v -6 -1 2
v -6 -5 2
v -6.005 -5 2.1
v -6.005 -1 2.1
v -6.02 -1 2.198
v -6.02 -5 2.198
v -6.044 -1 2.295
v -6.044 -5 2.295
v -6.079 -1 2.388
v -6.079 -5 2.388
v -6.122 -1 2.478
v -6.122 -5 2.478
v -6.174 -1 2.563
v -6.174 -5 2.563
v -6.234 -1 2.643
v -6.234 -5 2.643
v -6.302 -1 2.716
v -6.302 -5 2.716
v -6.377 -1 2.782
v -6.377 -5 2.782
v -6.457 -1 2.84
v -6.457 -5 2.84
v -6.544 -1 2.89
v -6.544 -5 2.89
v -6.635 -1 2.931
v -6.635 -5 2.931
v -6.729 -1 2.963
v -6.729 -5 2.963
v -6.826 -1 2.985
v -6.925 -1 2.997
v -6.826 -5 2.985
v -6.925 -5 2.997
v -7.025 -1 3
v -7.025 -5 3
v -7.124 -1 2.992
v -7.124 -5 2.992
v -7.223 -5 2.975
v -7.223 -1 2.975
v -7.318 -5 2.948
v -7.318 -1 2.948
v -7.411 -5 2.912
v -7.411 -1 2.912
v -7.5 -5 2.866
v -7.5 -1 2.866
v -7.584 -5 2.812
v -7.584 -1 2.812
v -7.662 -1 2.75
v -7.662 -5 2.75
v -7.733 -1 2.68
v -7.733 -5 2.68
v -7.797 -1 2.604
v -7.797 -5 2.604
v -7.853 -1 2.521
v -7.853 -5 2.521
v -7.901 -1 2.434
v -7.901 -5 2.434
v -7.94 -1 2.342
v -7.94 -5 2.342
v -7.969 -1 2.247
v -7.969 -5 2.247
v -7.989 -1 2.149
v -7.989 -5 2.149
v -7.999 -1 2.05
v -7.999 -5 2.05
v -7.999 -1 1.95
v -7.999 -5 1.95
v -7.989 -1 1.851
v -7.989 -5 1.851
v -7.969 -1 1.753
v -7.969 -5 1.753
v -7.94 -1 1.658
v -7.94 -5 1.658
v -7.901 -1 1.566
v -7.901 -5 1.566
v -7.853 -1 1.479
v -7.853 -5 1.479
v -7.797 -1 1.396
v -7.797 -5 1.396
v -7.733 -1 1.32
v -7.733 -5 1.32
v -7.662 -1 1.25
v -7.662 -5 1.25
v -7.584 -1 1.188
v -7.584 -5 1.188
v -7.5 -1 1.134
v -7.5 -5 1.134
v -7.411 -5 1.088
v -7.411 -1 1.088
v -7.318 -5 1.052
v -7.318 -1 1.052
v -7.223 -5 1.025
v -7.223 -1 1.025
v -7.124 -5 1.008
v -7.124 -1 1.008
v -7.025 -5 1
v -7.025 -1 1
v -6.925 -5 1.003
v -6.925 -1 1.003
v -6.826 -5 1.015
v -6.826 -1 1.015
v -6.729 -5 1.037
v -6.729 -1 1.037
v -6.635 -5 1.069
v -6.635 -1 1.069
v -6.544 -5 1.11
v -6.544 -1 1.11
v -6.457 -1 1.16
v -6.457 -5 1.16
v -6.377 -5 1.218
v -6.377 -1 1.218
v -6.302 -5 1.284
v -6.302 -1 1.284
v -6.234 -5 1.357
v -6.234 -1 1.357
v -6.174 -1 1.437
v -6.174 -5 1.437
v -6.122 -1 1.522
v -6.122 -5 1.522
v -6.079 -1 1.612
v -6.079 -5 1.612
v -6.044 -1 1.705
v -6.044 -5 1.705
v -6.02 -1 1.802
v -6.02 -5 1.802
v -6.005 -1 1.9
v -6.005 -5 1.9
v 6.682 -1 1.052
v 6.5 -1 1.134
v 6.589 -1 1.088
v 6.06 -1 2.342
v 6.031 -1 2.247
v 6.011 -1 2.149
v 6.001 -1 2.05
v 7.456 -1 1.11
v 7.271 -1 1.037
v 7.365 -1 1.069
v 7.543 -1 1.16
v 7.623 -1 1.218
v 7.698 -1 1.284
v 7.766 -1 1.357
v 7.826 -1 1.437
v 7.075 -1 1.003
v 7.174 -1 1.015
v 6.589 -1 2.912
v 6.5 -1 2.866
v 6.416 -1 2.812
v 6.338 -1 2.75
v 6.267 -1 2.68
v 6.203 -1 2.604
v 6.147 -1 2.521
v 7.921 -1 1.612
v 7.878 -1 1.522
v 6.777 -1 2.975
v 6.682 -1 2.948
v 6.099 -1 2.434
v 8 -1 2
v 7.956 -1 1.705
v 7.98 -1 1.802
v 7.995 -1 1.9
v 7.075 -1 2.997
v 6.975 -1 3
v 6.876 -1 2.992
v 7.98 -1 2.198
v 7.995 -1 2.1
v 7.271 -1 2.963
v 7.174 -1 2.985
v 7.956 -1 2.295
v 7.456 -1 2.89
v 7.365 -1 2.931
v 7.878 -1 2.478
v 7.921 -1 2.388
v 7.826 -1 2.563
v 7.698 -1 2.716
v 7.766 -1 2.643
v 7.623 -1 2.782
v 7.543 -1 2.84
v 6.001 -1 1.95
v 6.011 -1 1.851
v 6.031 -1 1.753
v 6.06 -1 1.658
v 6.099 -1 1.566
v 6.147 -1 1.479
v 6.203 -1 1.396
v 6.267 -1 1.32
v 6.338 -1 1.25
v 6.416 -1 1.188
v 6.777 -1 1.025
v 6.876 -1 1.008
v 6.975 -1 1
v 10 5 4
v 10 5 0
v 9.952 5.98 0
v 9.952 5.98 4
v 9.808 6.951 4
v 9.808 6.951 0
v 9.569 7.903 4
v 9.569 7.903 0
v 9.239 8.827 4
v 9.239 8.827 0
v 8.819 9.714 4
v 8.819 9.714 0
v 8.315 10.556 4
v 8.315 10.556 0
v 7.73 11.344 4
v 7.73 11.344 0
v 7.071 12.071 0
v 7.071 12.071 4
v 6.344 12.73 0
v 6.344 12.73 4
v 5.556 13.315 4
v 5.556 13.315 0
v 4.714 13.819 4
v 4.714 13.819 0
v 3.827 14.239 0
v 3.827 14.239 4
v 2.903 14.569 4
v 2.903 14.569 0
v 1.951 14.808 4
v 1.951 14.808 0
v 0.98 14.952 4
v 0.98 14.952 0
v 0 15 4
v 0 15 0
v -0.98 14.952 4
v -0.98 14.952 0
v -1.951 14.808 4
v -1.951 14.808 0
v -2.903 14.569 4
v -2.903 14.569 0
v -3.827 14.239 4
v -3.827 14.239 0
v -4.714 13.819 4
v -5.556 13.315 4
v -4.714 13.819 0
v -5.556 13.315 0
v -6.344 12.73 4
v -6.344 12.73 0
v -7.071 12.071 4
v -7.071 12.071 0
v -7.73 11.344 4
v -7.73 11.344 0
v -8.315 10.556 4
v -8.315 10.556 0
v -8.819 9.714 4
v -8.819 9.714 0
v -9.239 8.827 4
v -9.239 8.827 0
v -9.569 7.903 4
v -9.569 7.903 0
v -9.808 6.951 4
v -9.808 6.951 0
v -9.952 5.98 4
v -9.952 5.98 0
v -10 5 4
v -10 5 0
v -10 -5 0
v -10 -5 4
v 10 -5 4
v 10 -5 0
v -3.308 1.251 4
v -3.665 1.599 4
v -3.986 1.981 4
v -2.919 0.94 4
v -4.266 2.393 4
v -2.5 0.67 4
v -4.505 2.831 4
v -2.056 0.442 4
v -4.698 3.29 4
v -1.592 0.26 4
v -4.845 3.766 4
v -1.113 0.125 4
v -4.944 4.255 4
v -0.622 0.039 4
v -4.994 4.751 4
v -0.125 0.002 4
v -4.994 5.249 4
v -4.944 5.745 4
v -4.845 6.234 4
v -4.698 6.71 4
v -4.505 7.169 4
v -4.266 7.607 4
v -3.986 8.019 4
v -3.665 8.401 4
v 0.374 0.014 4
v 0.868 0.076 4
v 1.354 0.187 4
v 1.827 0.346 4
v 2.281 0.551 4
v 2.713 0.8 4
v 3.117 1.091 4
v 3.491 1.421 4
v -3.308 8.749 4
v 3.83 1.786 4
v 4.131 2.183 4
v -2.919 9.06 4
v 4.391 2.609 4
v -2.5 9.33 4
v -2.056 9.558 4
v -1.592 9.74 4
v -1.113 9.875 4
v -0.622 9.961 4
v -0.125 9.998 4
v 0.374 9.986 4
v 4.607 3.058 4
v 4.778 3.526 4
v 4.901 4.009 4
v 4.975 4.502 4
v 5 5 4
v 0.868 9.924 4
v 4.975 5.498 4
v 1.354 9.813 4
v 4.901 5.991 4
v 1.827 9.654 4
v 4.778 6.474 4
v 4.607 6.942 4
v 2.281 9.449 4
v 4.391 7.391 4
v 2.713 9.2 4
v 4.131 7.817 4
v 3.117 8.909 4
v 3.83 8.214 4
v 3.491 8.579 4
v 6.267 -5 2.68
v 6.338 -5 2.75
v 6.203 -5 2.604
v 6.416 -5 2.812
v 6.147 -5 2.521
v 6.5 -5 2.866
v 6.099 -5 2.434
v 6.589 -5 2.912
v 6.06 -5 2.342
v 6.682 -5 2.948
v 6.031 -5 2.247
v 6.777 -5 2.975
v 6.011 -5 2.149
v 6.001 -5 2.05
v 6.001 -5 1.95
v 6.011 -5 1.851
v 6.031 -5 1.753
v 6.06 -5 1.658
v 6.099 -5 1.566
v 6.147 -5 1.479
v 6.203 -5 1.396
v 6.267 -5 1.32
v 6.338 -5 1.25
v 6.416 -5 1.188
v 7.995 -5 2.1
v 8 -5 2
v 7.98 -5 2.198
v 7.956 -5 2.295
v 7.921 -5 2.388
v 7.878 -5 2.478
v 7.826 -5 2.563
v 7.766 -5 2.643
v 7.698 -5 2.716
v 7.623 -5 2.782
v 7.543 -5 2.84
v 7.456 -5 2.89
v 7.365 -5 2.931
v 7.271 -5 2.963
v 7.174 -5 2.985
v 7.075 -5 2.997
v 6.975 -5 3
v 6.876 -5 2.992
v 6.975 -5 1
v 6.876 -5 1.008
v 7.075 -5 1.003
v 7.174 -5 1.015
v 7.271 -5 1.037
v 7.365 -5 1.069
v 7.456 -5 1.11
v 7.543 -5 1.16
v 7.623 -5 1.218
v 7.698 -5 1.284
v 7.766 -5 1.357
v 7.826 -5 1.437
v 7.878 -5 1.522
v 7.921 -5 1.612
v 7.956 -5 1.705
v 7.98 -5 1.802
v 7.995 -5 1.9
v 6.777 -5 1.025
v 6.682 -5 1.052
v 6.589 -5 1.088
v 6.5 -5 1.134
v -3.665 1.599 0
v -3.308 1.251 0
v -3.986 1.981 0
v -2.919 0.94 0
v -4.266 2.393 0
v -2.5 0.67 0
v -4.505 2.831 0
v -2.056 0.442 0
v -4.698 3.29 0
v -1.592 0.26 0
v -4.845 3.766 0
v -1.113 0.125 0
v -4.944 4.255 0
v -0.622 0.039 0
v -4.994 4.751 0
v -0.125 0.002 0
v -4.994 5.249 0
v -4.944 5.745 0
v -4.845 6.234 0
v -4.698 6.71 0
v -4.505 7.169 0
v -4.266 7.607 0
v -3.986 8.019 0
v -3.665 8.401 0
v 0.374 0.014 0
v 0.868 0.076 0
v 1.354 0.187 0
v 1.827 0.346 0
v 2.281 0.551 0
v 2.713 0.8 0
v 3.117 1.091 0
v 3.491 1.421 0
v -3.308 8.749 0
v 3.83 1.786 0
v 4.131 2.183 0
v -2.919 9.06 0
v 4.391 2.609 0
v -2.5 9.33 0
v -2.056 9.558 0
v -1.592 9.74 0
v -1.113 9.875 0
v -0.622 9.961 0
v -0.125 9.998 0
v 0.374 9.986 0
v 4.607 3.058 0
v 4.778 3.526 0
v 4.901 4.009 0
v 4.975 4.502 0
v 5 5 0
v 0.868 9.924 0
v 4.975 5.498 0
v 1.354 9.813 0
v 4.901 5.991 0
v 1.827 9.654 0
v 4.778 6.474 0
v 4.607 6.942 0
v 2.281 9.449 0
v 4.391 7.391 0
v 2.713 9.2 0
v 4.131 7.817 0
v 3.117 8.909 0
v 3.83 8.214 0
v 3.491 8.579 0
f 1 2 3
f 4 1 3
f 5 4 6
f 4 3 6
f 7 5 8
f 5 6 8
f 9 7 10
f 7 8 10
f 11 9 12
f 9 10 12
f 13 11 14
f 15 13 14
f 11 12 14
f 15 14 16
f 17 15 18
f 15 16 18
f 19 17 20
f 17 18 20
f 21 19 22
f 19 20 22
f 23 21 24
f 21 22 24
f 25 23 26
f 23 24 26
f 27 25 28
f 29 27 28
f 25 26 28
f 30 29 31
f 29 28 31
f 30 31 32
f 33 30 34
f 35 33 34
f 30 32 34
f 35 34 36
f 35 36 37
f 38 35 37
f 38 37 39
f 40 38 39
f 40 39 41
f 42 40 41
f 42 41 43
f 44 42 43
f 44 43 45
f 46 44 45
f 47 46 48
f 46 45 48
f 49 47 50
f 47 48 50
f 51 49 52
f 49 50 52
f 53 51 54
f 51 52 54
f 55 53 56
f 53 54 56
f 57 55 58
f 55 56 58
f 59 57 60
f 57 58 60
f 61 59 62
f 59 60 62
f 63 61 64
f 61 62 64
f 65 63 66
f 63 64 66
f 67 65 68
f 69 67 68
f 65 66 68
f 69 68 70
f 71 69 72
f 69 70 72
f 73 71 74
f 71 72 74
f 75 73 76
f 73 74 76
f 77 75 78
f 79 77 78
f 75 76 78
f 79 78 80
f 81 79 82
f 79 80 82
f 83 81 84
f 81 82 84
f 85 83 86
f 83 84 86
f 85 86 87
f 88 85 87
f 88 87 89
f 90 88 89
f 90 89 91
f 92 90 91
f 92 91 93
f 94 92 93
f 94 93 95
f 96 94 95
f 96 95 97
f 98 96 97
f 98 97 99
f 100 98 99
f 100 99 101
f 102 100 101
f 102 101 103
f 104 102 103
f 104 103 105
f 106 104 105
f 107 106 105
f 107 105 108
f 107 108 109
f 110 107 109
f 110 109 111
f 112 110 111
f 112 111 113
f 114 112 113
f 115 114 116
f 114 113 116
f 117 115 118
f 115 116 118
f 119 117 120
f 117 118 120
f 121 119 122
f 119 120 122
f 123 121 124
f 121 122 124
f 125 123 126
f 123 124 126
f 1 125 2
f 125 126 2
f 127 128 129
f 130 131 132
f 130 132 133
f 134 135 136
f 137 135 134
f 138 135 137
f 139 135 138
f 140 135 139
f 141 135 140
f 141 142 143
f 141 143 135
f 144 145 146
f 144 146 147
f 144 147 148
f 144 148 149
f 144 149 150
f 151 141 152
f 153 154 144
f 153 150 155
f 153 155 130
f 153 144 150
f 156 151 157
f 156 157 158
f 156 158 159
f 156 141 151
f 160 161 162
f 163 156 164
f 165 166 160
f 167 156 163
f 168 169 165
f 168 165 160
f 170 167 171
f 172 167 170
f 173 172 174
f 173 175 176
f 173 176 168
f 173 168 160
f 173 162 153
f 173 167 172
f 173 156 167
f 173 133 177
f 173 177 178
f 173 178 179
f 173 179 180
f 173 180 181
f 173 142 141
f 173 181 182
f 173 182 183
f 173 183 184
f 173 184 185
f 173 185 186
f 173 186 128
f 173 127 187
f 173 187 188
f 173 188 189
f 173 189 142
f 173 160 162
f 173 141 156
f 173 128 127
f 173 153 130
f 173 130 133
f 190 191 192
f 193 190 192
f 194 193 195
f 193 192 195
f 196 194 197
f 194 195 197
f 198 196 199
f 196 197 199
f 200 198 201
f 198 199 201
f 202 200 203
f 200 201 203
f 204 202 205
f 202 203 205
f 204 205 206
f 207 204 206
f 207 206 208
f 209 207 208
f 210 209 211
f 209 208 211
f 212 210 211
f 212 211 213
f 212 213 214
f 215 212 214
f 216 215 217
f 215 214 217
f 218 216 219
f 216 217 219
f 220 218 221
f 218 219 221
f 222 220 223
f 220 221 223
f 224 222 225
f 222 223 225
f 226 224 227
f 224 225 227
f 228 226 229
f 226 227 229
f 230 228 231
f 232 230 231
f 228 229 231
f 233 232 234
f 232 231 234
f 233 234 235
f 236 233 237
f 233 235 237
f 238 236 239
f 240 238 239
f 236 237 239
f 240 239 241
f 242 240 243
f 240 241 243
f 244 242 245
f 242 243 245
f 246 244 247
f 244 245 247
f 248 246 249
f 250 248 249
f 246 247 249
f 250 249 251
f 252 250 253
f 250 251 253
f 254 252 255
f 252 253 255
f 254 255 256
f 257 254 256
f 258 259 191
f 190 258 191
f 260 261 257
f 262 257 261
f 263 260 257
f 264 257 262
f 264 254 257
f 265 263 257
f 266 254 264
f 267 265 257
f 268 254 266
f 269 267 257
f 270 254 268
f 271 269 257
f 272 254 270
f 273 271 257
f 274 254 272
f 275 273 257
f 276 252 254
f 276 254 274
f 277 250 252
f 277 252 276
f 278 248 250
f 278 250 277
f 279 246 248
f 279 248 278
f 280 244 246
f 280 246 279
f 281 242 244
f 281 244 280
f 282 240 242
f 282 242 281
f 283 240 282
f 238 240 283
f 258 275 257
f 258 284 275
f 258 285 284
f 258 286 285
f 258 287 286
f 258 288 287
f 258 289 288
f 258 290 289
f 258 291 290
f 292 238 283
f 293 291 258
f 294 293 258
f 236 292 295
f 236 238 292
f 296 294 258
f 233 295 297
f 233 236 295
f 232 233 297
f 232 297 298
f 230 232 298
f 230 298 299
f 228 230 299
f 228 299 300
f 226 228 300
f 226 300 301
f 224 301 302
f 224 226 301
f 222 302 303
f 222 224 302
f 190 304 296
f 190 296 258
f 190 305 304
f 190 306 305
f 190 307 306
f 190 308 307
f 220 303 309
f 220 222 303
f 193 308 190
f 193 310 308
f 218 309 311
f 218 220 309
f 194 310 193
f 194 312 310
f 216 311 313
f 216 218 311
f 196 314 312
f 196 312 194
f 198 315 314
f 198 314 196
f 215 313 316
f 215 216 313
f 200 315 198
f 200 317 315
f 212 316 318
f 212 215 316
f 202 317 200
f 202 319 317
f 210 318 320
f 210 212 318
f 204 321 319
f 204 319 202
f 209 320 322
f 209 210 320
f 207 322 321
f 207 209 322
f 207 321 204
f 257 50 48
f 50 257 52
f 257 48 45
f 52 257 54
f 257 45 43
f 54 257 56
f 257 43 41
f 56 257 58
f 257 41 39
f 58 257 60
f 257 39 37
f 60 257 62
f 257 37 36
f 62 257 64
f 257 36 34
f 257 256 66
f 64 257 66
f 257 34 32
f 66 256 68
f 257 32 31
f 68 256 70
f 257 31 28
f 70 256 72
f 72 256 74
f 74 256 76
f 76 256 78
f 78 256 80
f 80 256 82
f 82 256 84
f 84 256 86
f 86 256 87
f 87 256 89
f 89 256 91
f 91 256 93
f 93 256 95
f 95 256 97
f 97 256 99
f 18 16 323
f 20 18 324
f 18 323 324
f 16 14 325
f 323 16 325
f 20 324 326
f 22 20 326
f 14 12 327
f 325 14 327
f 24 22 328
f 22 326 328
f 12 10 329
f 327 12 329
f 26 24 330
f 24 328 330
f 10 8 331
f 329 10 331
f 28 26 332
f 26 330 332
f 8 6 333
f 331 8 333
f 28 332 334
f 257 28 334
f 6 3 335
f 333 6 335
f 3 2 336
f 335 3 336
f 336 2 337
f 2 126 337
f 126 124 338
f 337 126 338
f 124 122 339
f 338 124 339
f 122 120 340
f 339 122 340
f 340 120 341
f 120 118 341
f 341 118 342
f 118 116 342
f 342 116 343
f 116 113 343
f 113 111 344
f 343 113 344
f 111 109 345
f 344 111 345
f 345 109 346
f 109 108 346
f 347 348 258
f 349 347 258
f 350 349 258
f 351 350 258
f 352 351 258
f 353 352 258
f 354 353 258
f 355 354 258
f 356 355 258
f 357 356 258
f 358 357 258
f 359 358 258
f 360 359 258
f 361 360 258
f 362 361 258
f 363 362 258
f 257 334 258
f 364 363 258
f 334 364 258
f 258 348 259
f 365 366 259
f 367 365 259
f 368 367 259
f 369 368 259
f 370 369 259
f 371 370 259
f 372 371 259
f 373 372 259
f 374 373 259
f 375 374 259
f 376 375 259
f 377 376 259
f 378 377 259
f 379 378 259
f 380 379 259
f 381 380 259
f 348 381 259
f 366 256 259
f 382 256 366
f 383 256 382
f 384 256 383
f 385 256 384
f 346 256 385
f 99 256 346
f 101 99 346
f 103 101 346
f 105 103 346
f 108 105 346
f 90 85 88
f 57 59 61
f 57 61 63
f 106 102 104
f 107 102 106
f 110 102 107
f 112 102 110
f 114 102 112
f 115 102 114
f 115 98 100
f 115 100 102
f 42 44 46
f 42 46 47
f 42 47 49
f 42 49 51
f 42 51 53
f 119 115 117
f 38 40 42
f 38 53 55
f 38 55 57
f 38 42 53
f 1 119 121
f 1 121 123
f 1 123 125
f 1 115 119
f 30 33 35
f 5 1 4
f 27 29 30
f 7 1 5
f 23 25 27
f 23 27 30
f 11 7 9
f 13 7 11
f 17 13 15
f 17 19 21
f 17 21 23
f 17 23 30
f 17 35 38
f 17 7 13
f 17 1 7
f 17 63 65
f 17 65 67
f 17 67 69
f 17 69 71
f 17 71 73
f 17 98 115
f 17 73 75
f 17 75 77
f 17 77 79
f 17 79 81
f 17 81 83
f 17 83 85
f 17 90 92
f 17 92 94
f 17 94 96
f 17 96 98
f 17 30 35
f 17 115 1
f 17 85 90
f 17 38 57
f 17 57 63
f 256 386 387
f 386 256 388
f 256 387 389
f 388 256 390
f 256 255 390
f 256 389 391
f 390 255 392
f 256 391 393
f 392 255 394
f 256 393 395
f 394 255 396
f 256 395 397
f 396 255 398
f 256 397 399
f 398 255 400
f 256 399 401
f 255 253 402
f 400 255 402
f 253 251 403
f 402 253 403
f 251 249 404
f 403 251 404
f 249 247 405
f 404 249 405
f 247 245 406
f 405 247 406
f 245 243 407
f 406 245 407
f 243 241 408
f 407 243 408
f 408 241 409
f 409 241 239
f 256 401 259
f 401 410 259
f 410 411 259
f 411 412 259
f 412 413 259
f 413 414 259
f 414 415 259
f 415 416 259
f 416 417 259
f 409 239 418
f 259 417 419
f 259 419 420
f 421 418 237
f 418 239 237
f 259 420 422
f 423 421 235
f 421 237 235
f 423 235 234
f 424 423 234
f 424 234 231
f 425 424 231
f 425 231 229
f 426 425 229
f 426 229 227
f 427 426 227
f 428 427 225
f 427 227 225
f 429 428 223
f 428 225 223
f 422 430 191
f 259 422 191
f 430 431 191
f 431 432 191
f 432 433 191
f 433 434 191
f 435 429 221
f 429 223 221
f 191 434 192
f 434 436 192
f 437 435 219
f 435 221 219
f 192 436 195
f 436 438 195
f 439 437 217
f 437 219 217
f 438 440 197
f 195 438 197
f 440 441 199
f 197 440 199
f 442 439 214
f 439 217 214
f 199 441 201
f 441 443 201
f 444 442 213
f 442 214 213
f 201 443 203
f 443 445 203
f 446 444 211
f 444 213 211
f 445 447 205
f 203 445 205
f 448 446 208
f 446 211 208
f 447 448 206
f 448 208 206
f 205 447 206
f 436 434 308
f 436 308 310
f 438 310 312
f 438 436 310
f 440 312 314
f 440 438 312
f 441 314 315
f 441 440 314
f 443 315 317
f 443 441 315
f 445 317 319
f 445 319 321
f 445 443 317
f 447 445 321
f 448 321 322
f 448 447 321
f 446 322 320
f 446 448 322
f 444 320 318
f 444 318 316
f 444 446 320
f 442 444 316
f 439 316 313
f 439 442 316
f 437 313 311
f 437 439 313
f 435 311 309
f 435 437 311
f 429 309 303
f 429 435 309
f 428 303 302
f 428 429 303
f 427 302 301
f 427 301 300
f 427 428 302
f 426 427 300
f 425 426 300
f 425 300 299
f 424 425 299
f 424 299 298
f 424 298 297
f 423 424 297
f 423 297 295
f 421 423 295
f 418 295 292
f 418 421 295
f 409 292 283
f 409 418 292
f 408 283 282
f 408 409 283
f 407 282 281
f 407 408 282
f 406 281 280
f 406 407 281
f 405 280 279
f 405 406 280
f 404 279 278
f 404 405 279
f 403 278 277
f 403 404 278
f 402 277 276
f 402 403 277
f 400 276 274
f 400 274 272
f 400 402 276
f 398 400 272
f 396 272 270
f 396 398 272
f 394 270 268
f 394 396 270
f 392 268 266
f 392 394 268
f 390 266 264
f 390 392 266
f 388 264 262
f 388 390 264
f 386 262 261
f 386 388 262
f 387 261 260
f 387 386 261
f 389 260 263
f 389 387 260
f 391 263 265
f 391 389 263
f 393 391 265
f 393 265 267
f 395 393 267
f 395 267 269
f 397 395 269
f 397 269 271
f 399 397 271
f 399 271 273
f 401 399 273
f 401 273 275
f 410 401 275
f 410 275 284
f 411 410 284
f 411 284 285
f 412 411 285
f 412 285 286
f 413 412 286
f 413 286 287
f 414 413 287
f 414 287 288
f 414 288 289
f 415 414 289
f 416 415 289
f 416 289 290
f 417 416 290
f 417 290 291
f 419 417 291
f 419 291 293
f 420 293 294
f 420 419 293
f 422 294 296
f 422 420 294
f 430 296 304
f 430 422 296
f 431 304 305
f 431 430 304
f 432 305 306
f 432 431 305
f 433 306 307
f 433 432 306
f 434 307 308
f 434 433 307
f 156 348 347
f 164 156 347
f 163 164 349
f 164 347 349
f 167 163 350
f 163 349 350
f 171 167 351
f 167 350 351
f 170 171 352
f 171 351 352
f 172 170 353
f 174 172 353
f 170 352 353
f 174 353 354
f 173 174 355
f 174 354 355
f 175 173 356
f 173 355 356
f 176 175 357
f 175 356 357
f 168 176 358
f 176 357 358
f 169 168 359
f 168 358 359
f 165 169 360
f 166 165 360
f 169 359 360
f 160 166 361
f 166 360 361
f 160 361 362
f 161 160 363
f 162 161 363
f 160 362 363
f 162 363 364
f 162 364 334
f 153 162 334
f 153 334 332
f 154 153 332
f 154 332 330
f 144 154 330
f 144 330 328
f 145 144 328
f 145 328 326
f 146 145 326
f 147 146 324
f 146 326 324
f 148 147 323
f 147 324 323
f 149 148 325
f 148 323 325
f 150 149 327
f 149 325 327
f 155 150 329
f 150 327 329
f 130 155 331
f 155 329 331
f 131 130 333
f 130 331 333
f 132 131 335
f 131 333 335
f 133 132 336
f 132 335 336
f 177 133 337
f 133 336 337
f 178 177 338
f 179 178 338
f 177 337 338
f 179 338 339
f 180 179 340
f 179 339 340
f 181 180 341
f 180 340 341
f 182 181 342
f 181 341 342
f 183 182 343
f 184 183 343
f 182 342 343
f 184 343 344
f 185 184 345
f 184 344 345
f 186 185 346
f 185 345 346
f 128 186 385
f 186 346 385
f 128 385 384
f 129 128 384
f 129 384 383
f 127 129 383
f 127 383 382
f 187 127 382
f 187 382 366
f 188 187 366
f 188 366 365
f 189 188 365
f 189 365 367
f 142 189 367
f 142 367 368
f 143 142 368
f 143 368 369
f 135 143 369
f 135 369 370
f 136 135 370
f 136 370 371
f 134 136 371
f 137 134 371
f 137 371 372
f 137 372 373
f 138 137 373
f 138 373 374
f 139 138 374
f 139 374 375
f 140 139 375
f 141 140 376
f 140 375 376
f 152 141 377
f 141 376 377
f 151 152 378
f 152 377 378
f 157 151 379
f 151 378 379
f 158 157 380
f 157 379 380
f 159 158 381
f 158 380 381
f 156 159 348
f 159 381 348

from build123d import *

# Parameters (mm, degrees)
SKETCH1_R           = 5
BOSS_EXTRUDE1_DEPTH = 4
SKETCH2_R           = 1
CUT_EXTRUDE1_DEPTH  = 4


with BuildPart() as part:
    # Sketch1 → Boss-Extrude1 (new body)
    with BuildSketch(Plane.XY):
        with BuildLine():
            Line((-10, -5), (10, -5))
            Line((10, -5), (10, 5))
            ThreePointArc((10, 5), (0, 15), (-10, 5))
            Line((-10, 5), (-10, -5))
        make_face()
        with Locations((0, 5)):
            Circle(SKETCH1_R, mode=Mode.SUBTRACT)
    extrude(amount=BOSS_EXTRUDE1_DEPTH)

    # Sketch2 → Cut-Extrude1 (cut)
    with BuildSketch(Plane.XZ.offset(5)):
        with Locations((-7, 2)):
            Circle(SKETCH2_R)
        with Locations((7, 2)):
            Circle(SKETCH2_R)
    extrude(amount=-CUT_EXTRUDE1_DEPTH, mode=Mode.SUBTRACT)


solid = part.part
